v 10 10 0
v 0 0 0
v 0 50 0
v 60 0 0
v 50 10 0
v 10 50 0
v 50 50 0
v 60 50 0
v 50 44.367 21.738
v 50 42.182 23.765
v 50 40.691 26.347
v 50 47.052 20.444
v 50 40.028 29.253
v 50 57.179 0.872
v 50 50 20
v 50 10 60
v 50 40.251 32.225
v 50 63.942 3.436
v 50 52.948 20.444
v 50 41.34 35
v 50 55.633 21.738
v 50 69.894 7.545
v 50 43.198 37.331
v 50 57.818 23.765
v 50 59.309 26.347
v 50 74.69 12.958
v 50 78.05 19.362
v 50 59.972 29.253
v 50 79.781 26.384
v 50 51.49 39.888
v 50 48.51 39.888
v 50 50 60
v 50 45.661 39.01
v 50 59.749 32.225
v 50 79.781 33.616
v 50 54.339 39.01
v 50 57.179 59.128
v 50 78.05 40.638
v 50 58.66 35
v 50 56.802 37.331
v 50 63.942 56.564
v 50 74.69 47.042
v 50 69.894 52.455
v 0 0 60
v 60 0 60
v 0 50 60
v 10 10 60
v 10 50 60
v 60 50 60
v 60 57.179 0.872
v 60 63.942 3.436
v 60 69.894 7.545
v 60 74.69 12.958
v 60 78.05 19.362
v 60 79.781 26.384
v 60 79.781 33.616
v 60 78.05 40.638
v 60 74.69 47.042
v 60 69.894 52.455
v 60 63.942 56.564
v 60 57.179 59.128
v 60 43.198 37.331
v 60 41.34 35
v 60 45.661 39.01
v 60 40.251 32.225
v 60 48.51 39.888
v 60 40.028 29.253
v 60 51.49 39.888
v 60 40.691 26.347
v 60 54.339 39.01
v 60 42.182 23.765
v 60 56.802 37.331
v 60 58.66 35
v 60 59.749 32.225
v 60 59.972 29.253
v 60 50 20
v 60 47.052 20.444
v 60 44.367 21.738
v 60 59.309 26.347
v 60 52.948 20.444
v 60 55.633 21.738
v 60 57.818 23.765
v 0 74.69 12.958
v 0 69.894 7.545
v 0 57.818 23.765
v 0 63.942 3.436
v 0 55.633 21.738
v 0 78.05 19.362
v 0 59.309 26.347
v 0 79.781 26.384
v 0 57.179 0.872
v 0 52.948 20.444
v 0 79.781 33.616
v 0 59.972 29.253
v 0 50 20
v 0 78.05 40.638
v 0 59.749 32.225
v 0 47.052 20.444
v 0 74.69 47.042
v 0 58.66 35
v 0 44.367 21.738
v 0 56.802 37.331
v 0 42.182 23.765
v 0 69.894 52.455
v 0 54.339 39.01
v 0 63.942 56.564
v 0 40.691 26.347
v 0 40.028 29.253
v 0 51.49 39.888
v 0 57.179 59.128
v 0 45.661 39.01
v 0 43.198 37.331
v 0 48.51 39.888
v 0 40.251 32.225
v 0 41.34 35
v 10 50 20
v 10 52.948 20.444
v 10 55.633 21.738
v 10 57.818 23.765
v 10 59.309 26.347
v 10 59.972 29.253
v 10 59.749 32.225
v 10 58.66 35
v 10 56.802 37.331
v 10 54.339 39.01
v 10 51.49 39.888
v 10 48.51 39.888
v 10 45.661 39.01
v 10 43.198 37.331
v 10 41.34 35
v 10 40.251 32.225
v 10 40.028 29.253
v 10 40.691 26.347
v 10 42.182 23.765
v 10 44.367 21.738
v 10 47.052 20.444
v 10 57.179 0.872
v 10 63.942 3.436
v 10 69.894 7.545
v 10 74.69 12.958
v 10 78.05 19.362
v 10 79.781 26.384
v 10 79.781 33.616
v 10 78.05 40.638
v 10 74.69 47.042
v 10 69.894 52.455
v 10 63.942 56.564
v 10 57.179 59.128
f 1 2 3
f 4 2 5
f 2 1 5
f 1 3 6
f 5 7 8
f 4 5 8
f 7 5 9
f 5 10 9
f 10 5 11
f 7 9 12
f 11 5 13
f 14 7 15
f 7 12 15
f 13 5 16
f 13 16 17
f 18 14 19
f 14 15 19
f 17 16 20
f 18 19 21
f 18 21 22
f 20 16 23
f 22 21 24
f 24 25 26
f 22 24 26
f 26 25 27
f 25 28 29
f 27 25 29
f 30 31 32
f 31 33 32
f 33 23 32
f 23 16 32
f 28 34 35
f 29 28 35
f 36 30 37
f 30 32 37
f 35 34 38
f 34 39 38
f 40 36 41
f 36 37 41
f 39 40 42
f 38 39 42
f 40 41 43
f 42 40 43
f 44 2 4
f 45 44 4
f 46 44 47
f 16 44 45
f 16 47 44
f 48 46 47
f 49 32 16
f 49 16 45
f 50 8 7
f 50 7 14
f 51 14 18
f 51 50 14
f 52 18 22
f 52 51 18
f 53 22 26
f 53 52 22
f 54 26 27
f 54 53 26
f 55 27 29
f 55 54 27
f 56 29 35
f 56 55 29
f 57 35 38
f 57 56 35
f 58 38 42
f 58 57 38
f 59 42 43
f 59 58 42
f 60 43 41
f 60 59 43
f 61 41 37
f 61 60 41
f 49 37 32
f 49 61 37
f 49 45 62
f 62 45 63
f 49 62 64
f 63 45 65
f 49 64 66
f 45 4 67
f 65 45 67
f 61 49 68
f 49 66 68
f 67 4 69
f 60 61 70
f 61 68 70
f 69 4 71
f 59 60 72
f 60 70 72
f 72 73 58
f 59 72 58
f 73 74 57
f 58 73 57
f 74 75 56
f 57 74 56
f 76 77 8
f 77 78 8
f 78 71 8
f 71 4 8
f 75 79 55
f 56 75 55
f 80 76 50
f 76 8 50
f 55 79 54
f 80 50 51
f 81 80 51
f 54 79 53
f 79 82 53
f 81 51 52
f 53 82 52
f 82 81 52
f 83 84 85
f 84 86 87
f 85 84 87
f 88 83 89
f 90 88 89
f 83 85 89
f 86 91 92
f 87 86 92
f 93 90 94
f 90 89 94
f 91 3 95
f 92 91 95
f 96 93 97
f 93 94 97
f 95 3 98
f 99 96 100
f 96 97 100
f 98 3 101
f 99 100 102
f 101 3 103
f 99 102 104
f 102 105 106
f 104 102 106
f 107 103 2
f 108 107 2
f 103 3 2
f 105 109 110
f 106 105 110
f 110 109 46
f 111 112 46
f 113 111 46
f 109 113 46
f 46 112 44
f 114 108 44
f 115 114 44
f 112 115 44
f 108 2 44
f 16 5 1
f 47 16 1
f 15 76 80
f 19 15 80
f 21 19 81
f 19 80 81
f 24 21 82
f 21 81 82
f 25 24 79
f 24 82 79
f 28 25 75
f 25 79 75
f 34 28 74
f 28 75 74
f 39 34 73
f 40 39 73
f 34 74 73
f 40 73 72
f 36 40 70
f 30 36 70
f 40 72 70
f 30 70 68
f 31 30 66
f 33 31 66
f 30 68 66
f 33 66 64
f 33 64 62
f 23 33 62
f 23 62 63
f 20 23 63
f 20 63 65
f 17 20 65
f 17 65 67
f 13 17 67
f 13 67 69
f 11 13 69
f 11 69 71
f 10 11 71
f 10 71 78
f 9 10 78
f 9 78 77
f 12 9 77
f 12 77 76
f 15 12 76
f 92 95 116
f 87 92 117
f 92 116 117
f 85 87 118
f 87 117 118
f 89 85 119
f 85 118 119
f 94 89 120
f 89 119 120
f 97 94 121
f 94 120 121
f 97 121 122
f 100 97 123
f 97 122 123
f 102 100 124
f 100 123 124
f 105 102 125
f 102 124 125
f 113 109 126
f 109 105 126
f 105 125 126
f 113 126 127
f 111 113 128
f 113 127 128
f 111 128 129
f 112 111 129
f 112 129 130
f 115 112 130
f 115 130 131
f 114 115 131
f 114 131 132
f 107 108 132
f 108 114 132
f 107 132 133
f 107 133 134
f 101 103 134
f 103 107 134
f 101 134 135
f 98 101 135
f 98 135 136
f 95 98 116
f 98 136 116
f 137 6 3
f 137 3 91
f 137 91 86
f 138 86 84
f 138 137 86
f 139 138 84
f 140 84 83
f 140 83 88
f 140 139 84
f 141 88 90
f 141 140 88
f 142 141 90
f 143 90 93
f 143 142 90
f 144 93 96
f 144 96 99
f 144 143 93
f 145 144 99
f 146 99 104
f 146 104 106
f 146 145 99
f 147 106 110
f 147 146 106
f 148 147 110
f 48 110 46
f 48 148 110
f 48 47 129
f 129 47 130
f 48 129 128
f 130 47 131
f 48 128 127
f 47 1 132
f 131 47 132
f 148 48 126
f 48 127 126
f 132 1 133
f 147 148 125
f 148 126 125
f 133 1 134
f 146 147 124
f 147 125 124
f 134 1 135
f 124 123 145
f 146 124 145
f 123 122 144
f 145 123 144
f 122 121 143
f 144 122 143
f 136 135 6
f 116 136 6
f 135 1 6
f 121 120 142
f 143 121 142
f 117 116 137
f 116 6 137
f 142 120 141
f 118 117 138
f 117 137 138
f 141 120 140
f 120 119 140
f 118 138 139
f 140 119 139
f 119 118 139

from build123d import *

# Parameters (mm, degrees)
EXTRUDE_1_DEPTH     = 60
SKETCH_3_R          = 10
CUT_EXTRUDE_1_DEPTH = 99.488578018
EXTRUDE_START       = 60
SKETCH_8_R          = 30
SKETCH_8_R_2        = 10
EXTRUDE_5_DEPTH     = 60
SKETCH_10_W         = 40
SKETCH_10_H         = 70
CUT_EXTRUDE_3_DEPTH = 60


with BuildPart() as part:
    # 草圖2 → 填料-伸長1 (new body)
    with BuildSketch(Plane.XY):
        Polygon((0, 0), (60, 0), (60, 50), (50, 50), (50, 10), (10, 10), (10, 50), (0, 50), align=None)
    extrude(amount=EXTRUDE_1_DEPTH)

    # 草圖3 → 除料-伸長1 (cut, through all)
    with BuildSketch(Plane(origin=(60, 0, 0), x_dir=(0, 0, -1), z_dir=(1, 0, 0))):
        with Locations((-30, 50)):
            Circle(SKETCH_3_R)
    extrude(amount=-CUT_EXTRUDE_1_DEPTH, mode=Mode.SUBTRACT)

    # 草圖8 → 填料-伸長5 (add)
    with BuildSketch(Plane(origin=(0, 0, 0), x_dir=(0, 0, -1), z_dir=(1, 0, 0)).offset(EXTRUDE_START)):
        with Locations(Location((-30, 50, 0), (0, 0, 180))):
            Circle(SKETCH_8_R)
        with Locations((-30, 50)):
            Circle(SKETCH_8_R_2, mode=Mode.SUBTRACT)
    extrude(amount=-EXTRUDE_5_DEPTH)

    # 草圖10 → 除料-伸長3 (cut)
    with BuildSketch(Plane.XY.offset(60)):
        with Locations((30, 45)):
            Rectangle(SKETCH_10_W, SKETCH_10_H)
    extrude(amount=-CUT_EXTRUDE_3_DEPTH, mode=Mode.SUBTRACT)


solid = part.part
